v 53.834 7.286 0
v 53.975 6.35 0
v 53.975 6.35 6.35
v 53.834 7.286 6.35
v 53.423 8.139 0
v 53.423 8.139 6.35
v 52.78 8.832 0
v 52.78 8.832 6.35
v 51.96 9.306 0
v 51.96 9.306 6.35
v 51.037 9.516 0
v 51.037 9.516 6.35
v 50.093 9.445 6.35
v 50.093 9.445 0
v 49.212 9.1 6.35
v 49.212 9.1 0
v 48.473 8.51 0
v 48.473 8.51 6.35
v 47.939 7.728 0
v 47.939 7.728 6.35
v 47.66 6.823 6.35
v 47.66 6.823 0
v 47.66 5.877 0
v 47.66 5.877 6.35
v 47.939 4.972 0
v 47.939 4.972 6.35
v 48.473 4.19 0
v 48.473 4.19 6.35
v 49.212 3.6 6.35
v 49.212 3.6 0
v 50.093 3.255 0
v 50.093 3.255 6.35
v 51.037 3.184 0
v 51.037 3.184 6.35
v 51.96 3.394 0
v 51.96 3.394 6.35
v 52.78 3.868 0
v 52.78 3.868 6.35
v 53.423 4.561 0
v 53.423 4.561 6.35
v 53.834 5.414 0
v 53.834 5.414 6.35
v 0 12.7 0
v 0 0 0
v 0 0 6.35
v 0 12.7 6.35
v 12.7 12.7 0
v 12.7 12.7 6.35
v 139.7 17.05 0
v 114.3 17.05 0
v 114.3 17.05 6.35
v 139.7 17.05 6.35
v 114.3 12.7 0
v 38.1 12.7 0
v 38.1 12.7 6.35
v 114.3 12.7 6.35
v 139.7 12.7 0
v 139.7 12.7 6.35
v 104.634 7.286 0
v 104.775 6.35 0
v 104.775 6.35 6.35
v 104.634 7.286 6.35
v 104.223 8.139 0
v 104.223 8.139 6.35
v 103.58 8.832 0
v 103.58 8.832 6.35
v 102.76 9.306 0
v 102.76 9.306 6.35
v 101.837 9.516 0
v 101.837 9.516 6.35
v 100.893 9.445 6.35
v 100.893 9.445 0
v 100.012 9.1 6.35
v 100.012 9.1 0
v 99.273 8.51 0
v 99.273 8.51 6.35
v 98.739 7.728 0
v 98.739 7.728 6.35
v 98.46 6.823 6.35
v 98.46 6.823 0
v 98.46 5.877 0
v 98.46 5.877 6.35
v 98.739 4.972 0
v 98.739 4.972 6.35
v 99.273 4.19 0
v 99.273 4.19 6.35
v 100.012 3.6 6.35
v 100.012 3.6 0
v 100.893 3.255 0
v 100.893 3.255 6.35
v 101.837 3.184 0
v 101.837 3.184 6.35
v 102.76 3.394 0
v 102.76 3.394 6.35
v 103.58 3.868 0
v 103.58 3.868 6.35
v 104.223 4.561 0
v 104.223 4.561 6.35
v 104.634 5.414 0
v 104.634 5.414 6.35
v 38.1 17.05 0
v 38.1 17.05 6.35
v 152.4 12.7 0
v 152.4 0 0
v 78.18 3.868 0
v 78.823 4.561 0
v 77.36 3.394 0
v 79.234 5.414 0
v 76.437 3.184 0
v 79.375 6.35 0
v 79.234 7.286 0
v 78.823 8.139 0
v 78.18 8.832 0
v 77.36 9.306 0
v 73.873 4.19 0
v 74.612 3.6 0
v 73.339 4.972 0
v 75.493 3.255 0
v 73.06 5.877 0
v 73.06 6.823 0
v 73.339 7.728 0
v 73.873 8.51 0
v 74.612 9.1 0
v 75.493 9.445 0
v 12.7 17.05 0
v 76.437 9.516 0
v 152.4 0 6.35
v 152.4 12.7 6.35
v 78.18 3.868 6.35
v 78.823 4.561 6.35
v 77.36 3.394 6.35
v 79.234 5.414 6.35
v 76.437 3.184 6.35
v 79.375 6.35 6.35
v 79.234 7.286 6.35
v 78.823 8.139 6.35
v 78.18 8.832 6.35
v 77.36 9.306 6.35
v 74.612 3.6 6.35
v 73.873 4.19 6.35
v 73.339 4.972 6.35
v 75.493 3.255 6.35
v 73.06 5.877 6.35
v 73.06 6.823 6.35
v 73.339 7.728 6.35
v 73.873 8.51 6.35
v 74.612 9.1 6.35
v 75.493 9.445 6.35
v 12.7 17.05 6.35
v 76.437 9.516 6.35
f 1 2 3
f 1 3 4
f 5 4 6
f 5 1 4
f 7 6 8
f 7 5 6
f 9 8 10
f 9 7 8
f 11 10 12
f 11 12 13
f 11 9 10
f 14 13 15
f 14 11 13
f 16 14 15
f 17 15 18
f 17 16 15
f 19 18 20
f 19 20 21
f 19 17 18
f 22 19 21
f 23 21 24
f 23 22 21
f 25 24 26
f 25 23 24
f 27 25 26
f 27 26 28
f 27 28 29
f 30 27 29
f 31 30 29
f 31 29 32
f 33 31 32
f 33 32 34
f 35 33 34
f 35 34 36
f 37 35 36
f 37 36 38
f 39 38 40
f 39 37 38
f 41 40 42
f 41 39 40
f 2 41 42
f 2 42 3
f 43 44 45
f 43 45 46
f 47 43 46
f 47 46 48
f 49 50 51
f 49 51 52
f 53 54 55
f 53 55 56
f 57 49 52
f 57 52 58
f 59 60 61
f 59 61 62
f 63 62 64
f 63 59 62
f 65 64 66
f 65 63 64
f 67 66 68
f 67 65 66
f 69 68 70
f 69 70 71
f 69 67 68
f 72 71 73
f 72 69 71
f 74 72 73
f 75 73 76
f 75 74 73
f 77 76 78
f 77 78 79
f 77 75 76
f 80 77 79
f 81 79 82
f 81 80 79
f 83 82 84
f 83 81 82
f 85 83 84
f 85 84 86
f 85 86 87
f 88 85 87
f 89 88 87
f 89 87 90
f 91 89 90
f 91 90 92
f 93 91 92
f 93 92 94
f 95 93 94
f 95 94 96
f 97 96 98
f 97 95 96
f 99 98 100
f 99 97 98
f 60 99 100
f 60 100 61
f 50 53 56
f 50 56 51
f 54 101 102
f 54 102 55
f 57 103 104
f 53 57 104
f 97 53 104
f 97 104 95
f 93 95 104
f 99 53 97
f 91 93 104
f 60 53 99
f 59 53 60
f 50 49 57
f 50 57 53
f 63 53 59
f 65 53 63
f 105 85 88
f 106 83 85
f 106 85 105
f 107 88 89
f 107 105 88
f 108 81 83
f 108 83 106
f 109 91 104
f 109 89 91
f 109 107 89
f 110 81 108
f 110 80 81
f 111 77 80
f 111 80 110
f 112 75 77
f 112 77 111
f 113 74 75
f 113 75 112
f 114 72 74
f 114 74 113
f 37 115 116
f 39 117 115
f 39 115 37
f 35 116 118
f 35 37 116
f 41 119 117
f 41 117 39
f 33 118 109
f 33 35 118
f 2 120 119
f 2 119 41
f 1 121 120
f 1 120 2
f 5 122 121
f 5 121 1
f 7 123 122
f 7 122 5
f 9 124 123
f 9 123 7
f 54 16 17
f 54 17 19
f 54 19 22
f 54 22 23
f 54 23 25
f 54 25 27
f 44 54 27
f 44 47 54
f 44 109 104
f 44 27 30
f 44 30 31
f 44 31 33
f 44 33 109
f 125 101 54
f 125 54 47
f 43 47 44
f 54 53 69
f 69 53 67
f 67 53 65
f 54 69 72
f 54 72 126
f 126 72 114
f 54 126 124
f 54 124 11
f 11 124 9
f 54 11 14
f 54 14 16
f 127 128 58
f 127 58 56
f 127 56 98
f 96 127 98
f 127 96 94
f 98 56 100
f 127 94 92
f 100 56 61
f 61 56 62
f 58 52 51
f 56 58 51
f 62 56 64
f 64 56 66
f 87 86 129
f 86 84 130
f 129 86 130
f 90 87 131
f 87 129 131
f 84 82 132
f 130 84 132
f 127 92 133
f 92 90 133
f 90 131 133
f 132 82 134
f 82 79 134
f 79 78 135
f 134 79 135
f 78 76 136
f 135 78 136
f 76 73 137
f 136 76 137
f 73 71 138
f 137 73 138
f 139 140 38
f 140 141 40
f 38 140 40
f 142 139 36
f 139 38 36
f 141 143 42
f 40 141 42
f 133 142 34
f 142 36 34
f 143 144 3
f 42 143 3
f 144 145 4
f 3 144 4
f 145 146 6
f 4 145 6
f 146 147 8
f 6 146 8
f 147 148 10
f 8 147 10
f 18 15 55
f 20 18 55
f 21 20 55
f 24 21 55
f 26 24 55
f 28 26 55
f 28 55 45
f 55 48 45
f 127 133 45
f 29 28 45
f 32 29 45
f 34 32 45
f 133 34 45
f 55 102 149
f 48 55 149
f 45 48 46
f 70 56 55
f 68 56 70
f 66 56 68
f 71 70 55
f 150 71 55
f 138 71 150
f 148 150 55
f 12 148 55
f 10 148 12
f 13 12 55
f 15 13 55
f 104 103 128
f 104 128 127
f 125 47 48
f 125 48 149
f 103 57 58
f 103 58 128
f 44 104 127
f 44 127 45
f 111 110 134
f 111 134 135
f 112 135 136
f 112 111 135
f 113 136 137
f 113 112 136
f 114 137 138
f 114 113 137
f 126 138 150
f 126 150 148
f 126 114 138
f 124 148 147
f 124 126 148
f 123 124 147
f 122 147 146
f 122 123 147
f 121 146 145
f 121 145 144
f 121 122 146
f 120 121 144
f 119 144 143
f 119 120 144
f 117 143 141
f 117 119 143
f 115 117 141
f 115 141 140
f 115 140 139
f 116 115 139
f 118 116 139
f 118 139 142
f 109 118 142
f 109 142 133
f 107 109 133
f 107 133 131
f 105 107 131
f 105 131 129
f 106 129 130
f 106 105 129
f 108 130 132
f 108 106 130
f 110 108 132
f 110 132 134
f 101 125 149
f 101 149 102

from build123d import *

# Parameters (mm, degrees)
SKETCH1_R           = 3.175
BOSS_EXTRUDE1_DEPTH = 6.35


with BuildPart() as part:
    # Sketch1 → Boss-Extrude1 (new body)
    with BuildSketch(Plane.XY):
        Polygon((38.1, 12.7), (114.3, 12.7), (114.3, 17.050166685), (139.7, 17.050166685), (139.7, 12.7), (152.4, 12.7), (152.4, 0), (0, 0), (0, 12.7), (12.7, 12.7), (12.7, 17.050166685), (38.1, 17.050166685), align=None)
        with Locations((50.8, 6.35)):
            Circle(SKETCH1_R, mode=Mode.SUBTRACT)
        with Locations((76.2, 6.35)):
            Circle(SKETCH1_R, mode=Mode.SUBTRACT)
        with Locations((101.6, 6.35)):
            Circle(SKETCH1_R, mode=Mode.SUBTRACT)
    extrude(amount=BOSS_EXTRUDE1_DEPTH)


solid = part.part
